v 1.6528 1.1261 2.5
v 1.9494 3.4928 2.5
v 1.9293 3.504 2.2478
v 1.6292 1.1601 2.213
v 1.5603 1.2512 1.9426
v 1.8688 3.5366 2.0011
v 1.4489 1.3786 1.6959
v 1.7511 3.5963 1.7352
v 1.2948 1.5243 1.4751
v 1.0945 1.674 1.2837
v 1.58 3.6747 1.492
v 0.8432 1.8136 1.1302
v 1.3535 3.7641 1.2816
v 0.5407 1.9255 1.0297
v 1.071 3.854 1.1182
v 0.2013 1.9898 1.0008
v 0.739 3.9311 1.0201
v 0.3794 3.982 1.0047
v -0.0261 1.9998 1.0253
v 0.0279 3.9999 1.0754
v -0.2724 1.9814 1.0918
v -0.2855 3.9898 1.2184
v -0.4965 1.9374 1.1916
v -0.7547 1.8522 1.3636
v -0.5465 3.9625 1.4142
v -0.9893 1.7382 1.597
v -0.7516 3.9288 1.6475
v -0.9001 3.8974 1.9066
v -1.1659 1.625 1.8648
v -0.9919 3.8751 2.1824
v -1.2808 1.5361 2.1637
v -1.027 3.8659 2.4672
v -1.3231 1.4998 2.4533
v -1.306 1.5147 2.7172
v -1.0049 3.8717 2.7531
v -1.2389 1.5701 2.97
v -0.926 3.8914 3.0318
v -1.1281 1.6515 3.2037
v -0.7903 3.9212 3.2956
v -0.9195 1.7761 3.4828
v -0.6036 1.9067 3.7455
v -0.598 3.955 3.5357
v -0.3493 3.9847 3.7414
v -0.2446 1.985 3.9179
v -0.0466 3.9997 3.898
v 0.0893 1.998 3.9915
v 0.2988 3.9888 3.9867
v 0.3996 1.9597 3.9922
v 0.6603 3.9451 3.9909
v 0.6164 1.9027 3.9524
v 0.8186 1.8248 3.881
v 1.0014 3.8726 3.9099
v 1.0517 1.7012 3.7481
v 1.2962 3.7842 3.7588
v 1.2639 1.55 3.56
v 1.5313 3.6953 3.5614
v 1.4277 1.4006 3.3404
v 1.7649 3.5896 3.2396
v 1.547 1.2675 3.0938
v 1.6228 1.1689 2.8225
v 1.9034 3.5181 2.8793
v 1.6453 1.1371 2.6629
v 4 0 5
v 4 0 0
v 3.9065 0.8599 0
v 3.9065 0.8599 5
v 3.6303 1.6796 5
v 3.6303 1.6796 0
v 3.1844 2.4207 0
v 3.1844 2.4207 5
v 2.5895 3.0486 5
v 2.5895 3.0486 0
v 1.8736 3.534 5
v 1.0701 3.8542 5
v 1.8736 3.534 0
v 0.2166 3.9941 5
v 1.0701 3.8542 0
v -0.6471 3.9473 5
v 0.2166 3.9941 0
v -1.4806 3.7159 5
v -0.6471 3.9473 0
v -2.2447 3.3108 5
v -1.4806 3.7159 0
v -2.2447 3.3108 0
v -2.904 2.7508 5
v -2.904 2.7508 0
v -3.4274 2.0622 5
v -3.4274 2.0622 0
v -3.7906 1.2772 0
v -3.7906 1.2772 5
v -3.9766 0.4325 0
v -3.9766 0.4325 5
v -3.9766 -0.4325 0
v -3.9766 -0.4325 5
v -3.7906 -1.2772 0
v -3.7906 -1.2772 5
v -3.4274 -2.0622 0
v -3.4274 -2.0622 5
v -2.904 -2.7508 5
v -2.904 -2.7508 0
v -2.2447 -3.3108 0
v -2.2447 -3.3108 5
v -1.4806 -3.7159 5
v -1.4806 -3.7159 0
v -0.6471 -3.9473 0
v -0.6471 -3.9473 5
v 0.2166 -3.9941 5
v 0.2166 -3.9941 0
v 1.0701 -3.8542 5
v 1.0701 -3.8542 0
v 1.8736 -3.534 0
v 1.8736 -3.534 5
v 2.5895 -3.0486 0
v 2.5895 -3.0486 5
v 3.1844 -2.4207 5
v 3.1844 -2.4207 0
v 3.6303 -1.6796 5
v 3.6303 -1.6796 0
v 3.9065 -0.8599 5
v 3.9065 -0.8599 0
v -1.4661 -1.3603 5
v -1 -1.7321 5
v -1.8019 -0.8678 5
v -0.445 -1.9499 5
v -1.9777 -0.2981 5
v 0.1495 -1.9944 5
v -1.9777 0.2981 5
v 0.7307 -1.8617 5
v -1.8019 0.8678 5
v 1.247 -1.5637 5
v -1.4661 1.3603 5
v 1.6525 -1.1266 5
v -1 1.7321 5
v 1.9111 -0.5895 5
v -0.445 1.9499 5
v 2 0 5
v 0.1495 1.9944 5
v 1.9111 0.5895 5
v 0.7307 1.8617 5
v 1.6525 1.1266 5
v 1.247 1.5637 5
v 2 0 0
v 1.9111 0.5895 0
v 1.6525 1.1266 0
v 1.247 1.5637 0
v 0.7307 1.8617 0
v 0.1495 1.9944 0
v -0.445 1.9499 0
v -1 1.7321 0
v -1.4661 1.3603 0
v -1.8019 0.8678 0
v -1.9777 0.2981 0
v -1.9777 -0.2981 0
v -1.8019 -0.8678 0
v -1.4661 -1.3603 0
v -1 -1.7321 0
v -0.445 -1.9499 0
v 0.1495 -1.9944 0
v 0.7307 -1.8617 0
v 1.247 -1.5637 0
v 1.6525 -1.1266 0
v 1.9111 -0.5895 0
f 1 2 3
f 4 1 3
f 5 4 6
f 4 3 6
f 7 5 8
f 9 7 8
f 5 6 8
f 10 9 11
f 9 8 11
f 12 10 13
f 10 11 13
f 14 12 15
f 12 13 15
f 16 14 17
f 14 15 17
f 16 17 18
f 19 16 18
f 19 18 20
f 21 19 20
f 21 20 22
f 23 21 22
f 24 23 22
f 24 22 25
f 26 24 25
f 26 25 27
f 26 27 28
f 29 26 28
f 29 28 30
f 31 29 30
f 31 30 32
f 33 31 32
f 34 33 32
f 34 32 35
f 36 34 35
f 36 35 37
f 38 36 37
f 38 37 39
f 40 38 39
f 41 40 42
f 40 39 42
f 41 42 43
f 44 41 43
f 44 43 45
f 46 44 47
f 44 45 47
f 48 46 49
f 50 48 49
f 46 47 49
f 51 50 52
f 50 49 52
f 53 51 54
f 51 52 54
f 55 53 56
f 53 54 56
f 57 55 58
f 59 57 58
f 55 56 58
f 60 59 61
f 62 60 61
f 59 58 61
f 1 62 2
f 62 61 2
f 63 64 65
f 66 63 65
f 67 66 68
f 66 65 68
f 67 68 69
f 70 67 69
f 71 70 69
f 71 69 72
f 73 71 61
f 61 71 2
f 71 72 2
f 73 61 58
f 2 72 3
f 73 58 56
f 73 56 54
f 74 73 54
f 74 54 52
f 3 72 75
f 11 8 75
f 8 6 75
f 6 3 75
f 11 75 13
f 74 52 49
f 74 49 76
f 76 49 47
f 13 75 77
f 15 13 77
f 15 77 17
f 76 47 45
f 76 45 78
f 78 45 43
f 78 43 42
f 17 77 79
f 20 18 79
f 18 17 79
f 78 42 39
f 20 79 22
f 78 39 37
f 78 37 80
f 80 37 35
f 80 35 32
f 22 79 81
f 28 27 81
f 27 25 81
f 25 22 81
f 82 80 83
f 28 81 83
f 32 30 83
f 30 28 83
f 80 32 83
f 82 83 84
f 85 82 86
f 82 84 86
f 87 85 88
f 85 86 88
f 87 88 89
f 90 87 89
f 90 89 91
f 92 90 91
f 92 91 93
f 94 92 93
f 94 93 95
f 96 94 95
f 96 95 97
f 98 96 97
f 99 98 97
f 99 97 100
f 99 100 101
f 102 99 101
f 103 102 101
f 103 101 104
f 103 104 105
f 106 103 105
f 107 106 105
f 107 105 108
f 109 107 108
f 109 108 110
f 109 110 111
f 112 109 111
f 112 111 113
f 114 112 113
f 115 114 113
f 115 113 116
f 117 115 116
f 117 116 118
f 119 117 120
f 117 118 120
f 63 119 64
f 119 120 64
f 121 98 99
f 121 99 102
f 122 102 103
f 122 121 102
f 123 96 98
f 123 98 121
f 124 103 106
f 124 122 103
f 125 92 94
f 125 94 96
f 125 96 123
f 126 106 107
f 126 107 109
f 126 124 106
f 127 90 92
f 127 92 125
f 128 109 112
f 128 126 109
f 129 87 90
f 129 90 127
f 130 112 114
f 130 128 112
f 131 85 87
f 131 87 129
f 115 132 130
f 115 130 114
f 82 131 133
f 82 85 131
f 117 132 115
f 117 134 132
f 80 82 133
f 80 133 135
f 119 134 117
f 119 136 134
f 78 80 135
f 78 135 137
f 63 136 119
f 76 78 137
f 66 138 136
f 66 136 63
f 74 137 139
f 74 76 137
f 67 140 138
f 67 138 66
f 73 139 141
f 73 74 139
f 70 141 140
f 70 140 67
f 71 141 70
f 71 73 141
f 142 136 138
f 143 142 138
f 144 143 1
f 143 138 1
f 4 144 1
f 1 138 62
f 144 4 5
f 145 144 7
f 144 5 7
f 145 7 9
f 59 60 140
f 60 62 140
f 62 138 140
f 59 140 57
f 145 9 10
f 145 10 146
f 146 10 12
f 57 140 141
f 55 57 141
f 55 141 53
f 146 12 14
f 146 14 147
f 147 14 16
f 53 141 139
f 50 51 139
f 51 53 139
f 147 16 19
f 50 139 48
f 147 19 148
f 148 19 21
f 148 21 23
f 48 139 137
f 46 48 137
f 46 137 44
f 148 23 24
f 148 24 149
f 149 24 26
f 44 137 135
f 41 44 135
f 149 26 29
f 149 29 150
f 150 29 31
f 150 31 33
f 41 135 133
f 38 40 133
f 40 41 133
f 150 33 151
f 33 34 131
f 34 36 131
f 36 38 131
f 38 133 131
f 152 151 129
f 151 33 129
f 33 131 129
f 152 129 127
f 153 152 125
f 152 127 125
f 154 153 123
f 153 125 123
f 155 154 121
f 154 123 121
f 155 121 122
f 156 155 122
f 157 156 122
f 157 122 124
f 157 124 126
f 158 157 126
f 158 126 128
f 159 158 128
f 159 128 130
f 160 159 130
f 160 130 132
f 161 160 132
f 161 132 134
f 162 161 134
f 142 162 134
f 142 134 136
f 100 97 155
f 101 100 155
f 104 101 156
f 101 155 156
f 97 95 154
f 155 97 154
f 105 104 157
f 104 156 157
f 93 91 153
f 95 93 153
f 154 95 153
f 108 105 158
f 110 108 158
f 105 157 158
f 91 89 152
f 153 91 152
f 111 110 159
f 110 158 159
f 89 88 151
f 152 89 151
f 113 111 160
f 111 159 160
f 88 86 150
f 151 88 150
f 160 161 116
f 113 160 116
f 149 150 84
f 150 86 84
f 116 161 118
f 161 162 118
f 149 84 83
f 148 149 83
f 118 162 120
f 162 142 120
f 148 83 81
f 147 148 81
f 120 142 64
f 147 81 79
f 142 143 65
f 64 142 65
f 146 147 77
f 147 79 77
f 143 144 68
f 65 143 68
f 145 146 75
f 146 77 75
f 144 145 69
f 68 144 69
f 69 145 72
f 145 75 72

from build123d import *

# Parameters (mm, degrees)
SKETCH_1_R          = 4
EXTRUDE_1_DEPTH     = 5
SKETCH_2_R          = 2
CUT_EXTRUDE_1_DEPTH = 8.549834435
M3X0_5_1_REACH      = 11.486
M3X0_5_1_BORE_R     = 1.5


with BuildPart() as part:
    # ｽｹｯﾁ1 → ﾎﾞｽ - 押し出し1 (new body)
    with BuildSketch(Plane.XY):
        Circle(SKETCH_1_R)
    extrude(amount=EXTRUDE_1_DEPTH)

    # ｽｹｯﾁ2 → ｶｯﾄ - 押し出し1 (cut, through all)
    with BuildSketch(Plane.XY.offset(5)):
        Circle(SKETCH_2_R)
    extrude(amount=-CUT_EXTRUDE_1_DEPTH, mode=Mode.SUBTRACT)

    # M3x0.5 ねじ穴1 bore (on position points) → M3x0.5 ねじ穴1 (cut, up to next)
    with BuildSketch(Plane(origin=(0.497313961, 3.968964452, 2.5), x_dir=(0.992241113083, -0.124328490328, 0), z_dir=(0.124328490328, 0.992241113083, 0)), mode=Mode.PRIVATE) as m3x0_5_1_sk1:
        Circle(M3X0_5_1_BORE_R)
    m3x0_5_1_tool1 = extrude(m3x0_5_1_sk1.sketch, amount=-M3X0_5_1_REACH, mode=Mode.PRIVATE) & part.part
    add(m3x0_5_1_tool1.solids().sort_by_distance((0.497314, 3.968964, 2.5))[0], mode=Mode.SUBTRACT)


solid = part.part
